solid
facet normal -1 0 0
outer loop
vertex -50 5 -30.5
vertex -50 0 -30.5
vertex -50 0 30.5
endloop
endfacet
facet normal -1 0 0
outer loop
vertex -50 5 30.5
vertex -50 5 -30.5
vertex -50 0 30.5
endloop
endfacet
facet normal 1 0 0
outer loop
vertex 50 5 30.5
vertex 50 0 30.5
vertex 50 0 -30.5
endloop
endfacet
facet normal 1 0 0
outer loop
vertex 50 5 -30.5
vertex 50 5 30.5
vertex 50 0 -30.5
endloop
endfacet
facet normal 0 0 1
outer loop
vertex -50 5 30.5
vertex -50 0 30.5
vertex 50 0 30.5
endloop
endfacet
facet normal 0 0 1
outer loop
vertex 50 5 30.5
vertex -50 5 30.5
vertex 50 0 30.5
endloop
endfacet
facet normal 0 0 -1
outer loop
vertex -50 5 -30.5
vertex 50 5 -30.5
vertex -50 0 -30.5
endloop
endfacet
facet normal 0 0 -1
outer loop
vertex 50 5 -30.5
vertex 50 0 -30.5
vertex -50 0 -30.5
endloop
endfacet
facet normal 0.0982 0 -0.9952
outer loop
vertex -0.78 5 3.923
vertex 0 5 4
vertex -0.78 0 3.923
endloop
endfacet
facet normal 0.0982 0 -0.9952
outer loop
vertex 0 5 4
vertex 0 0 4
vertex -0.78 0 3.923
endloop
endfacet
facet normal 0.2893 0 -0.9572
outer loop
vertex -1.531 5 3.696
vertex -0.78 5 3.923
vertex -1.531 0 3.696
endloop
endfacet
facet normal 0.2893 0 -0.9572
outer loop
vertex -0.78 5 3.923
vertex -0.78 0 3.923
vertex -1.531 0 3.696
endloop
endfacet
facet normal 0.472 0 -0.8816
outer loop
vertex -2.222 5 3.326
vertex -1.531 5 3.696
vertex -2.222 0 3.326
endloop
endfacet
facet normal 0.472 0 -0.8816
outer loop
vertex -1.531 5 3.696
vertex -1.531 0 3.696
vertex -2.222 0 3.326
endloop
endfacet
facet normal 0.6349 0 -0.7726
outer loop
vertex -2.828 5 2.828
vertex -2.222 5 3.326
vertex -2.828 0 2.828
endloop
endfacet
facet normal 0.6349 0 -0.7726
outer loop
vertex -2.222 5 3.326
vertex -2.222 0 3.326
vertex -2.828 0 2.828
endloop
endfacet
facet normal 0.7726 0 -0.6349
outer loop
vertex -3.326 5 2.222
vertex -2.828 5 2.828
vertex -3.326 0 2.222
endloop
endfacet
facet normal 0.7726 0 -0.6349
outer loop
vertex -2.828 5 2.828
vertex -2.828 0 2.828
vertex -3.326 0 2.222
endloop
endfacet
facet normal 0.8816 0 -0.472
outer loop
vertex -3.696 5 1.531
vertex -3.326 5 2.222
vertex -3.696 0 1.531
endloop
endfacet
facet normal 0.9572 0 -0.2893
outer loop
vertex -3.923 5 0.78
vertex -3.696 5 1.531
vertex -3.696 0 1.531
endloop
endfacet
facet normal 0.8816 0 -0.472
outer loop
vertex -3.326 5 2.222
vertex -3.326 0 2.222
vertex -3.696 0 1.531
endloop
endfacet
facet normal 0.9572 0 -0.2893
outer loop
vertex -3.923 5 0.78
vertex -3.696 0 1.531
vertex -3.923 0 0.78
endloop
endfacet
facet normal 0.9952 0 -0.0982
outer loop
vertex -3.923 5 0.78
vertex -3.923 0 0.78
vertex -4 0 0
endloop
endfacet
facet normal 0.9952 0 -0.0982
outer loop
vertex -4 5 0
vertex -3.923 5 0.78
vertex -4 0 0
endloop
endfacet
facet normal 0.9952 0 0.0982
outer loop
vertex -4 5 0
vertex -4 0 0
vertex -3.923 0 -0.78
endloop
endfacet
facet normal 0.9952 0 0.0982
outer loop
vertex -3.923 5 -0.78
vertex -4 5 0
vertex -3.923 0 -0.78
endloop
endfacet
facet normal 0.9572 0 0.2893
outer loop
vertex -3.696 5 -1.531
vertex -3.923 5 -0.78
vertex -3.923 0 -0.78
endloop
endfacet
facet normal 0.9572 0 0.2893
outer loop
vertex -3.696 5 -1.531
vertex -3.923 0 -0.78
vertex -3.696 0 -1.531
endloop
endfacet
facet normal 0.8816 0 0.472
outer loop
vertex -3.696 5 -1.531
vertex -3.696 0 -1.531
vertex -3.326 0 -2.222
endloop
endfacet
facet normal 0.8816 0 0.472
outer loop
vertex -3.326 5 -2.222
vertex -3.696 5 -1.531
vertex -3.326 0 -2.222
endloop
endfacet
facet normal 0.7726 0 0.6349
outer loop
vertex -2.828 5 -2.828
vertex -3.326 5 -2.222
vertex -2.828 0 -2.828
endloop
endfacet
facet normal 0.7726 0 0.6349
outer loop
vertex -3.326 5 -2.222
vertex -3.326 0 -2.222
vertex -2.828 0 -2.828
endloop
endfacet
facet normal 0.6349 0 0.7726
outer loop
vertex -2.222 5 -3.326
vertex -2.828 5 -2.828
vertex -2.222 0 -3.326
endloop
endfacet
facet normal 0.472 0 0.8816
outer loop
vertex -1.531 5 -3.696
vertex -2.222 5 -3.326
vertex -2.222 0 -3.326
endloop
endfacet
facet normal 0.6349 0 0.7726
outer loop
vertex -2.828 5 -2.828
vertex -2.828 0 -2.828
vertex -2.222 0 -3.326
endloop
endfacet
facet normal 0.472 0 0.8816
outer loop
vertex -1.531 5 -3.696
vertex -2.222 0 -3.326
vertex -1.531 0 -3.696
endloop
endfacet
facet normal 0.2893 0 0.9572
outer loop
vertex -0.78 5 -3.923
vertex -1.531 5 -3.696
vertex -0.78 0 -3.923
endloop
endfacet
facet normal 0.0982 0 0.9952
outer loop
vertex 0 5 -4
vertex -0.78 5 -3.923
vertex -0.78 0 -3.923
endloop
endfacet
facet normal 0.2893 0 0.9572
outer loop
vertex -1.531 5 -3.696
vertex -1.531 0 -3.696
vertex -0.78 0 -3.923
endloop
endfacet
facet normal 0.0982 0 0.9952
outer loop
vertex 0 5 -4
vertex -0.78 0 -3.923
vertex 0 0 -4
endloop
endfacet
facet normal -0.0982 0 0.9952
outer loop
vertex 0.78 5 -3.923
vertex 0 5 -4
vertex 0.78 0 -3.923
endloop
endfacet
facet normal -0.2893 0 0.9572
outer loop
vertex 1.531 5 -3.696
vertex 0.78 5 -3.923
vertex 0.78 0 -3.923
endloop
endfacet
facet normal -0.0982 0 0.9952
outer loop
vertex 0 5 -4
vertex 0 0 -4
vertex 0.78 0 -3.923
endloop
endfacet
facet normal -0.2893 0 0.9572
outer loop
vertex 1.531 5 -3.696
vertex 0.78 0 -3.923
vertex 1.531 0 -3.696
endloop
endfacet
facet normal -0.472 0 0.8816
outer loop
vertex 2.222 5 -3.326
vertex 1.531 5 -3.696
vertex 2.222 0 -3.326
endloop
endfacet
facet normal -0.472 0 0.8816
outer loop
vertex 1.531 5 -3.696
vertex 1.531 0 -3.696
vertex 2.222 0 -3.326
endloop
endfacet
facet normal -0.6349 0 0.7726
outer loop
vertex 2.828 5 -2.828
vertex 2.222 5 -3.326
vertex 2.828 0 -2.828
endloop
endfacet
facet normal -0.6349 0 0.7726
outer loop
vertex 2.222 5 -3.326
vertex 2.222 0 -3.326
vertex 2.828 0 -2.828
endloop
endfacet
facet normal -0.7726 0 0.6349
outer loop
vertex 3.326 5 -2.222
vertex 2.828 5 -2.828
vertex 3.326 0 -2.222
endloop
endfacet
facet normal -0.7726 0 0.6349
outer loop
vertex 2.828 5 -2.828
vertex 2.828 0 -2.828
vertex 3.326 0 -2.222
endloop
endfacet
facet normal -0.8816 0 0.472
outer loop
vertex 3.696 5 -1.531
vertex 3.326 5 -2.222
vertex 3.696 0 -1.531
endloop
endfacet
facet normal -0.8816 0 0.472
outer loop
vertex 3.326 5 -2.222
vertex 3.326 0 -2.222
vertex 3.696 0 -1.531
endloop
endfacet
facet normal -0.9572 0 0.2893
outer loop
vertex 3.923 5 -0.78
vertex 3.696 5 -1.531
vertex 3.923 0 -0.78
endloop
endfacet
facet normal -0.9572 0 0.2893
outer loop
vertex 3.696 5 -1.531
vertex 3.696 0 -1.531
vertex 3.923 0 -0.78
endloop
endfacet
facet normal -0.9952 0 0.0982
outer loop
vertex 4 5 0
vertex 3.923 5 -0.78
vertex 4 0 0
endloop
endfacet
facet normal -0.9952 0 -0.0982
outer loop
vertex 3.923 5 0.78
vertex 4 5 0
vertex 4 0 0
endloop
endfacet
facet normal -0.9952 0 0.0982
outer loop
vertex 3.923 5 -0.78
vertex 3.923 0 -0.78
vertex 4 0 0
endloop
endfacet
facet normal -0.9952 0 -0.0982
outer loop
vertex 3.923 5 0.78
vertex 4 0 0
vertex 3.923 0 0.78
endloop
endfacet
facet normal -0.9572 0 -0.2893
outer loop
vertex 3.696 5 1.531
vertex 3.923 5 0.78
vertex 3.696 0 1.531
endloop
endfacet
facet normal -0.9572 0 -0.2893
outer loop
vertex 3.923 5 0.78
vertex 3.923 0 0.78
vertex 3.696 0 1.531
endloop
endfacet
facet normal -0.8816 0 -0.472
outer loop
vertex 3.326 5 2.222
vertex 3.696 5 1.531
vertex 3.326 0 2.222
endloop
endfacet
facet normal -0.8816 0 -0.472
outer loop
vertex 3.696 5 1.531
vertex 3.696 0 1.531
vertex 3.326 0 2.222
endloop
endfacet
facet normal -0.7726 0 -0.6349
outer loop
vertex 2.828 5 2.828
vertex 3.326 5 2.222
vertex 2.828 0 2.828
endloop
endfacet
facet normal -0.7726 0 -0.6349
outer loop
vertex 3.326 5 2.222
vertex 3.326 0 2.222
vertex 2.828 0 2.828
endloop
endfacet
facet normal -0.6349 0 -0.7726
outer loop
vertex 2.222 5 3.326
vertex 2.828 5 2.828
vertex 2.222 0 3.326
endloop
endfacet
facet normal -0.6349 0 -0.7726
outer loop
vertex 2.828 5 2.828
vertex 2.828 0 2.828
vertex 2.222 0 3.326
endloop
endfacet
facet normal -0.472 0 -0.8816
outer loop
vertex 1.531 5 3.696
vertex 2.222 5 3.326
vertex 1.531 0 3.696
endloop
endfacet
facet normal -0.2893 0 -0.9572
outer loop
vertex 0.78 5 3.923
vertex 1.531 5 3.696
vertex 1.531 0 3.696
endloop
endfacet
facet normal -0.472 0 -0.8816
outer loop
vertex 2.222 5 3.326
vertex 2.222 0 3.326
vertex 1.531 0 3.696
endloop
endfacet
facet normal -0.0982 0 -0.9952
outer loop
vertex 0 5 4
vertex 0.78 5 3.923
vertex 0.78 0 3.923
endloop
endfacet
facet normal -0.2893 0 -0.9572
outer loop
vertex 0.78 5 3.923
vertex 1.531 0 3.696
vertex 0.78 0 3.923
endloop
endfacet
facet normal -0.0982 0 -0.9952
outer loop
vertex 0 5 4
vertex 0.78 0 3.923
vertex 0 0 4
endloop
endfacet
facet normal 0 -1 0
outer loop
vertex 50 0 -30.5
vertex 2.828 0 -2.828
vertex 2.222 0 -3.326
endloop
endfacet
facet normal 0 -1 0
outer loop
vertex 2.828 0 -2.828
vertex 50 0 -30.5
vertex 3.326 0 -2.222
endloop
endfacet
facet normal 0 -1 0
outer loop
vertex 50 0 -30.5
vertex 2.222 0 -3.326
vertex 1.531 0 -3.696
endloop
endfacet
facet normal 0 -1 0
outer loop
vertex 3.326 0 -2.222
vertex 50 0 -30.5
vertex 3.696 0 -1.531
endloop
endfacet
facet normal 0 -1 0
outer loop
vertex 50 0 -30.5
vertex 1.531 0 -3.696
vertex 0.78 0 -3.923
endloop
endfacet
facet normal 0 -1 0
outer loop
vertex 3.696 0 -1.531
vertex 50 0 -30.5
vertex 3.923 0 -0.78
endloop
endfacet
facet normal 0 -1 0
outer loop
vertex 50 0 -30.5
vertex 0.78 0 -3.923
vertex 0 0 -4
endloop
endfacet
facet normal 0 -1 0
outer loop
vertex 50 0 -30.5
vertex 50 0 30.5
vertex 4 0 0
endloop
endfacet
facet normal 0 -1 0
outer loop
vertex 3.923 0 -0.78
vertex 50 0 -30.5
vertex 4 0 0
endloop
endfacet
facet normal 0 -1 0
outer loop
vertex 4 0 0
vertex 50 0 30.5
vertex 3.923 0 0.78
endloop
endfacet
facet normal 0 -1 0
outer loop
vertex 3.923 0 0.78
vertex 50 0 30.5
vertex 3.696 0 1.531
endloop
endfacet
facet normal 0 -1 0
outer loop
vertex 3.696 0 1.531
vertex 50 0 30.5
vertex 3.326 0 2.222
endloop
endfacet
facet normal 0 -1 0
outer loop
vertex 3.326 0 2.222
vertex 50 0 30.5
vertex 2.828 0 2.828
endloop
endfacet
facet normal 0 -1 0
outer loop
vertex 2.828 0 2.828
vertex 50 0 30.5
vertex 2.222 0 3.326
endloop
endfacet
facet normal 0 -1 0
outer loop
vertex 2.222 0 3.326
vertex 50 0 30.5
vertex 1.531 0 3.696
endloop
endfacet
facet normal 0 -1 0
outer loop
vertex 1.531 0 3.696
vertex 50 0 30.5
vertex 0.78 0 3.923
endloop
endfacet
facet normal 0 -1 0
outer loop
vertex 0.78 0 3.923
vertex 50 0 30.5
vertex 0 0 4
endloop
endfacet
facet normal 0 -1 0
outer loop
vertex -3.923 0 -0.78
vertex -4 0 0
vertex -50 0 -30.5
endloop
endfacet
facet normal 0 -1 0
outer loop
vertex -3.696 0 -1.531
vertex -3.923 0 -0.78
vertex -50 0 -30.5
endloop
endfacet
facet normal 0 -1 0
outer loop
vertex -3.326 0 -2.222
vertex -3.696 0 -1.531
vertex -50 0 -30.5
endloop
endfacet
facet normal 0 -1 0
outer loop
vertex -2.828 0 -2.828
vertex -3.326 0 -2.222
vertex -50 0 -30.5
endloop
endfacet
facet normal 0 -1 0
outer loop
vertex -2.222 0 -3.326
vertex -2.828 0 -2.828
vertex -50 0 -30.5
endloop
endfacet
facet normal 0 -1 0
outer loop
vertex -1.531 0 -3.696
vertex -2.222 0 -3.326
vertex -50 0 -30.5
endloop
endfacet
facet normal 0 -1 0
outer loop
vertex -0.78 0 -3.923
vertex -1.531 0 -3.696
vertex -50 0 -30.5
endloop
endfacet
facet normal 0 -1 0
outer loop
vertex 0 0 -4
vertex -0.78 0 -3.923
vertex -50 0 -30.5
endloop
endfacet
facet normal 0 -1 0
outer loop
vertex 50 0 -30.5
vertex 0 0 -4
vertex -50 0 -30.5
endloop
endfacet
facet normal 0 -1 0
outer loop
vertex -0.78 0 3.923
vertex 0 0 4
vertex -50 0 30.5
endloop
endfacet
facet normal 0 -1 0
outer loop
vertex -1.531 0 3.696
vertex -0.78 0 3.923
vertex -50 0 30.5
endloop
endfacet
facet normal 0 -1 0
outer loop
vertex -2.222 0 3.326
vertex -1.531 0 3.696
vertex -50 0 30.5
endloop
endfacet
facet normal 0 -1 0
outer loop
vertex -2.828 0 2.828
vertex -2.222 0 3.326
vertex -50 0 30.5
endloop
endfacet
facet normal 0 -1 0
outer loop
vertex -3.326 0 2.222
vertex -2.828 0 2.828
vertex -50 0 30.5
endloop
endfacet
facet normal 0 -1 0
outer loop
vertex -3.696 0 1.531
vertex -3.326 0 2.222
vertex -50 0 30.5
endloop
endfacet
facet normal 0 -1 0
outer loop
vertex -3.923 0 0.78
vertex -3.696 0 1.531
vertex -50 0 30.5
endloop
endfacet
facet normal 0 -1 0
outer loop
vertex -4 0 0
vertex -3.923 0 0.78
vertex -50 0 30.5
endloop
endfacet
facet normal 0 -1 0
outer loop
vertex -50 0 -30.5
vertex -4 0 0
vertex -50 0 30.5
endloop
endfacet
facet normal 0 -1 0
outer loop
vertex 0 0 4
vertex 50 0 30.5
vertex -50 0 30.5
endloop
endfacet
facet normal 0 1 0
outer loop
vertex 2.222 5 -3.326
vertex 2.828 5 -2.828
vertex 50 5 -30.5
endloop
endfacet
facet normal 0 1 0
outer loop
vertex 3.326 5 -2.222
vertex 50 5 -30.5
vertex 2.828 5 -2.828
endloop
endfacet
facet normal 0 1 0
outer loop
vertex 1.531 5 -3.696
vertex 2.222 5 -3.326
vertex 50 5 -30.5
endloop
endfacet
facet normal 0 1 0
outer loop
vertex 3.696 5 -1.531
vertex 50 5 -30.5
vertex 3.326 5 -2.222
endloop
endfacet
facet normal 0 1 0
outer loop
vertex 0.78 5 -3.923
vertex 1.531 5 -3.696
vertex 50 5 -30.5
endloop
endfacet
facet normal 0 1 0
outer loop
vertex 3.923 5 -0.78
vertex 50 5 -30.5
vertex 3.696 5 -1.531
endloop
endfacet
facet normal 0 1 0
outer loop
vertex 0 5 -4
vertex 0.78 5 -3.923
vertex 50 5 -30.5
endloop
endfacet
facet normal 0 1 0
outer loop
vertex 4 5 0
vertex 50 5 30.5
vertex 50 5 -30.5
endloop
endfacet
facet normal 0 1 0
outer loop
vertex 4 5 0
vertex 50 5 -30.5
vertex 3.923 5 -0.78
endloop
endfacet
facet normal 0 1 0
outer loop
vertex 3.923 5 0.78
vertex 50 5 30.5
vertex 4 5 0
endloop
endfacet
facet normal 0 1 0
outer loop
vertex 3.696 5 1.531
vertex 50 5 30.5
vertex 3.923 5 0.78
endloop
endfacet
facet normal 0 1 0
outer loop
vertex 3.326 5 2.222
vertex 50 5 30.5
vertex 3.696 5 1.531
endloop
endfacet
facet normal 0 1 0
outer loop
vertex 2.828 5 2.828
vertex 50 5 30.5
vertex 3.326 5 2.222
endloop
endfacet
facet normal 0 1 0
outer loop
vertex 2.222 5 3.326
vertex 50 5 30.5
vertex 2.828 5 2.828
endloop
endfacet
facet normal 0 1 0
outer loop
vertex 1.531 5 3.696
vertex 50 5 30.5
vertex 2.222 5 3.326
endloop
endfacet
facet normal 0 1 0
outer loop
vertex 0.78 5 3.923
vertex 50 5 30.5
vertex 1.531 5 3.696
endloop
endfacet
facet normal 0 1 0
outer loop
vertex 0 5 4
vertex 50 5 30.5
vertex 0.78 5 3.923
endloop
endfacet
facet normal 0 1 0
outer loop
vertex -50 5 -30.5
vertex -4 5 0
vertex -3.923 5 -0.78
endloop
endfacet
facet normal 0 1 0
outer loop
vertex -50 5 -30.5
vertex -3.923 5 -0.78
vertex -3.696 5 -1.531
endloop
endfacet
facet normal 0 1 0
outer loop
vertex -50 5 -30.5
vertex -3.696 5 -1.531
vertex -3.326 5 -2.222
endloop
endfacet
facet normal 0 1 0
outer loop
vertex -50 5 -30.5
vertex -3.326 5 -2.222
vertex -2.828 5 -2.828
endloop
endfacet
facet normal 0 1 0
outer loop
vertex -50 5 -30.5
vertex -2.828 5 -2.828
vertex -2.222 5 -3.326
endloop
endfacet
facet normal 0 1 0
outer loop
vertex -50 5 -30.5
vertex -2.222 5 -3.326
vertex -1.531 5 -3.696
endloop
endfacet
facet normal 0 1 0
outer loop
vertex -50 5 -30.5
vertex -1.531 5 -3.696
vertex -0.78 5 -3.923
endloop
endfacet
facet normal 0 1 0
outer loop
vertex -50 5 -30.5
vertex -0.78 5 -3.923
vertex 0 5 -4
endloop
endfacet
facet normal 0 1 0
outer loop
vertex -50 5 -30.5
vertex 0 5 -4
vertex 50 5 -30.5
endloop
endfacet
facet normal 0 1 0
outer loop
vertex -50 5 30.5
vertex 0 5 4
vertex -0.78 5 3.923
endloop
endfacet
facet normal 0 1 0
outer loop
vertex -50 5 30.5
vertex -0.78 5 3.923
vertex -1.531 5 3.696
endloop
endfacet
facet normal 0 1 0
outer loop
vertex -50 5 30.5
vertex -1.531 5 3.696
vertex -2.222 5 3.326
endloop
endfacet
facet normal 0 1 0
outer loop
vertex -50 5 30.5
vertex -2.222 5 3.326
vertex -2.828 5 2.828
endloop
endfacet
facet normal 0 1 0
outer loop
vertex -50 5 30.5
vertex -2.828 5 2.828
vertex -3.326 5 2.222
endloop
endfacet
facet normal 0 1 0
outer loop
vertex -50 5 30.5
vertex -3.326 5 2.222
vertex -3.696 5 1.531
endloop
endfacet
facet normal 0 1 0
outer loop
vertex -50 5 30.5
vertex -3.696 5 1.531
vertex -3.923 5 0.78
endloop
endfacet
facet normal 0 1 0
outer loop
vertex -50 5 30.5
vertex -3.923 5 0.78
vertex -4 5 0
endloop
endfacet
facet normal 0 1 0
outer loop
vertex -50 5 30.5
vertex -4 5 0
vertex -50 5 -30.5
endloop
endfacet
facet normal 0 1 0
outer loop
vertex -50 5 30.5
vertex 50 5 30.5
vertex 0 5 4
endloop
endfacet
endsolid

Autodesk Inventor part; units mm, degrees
ref_plane "YZ Plane" through (0, 0, 0) normal (1, 0, 0) x (0, 1, 0)
ref_plane "XZ Plane" through (0, 0, 0) normal (0, 1, 0) x (-1, 0, 0)
ref_plane "XY Plane" through (0, 0, 0) normal (0, 0, 1) x (1, 0, 0)
sketch "Sketch1" plane through (0, 0, 0) normal (0, 1, 0) x (-1, 0, 0)
  line L0 (50, 30.5) -> (-50, 30.5)
  line L1 (-50, 30.5) -> (-50, -30.5)
  line L2 (-50, -30.5) -> (50, -30.5)
  line L3 (50, -30.5) -> (50, 30.5)
  line L4 (50, 30.5) -> (-50, -30.5) construction
  line L5 (-50, 30.5) -> (50, -30.5) construction
  point P0 (0, 0)
  dimension "d4" = 61
  dimension "d5" = 100
extrude "Extrusion1" add sketch "Sketch1" along normal blind 5
sketch "Sketch2" plane through (0, 5, 0) normal (0, 1, 0) x (1, 0, 0)
  point P0 (0, 0)
hole "Hole1" at (0, 5, 0) direction (0, -1, 0) diameter 8 end up to surface
properties part number "jalador"
